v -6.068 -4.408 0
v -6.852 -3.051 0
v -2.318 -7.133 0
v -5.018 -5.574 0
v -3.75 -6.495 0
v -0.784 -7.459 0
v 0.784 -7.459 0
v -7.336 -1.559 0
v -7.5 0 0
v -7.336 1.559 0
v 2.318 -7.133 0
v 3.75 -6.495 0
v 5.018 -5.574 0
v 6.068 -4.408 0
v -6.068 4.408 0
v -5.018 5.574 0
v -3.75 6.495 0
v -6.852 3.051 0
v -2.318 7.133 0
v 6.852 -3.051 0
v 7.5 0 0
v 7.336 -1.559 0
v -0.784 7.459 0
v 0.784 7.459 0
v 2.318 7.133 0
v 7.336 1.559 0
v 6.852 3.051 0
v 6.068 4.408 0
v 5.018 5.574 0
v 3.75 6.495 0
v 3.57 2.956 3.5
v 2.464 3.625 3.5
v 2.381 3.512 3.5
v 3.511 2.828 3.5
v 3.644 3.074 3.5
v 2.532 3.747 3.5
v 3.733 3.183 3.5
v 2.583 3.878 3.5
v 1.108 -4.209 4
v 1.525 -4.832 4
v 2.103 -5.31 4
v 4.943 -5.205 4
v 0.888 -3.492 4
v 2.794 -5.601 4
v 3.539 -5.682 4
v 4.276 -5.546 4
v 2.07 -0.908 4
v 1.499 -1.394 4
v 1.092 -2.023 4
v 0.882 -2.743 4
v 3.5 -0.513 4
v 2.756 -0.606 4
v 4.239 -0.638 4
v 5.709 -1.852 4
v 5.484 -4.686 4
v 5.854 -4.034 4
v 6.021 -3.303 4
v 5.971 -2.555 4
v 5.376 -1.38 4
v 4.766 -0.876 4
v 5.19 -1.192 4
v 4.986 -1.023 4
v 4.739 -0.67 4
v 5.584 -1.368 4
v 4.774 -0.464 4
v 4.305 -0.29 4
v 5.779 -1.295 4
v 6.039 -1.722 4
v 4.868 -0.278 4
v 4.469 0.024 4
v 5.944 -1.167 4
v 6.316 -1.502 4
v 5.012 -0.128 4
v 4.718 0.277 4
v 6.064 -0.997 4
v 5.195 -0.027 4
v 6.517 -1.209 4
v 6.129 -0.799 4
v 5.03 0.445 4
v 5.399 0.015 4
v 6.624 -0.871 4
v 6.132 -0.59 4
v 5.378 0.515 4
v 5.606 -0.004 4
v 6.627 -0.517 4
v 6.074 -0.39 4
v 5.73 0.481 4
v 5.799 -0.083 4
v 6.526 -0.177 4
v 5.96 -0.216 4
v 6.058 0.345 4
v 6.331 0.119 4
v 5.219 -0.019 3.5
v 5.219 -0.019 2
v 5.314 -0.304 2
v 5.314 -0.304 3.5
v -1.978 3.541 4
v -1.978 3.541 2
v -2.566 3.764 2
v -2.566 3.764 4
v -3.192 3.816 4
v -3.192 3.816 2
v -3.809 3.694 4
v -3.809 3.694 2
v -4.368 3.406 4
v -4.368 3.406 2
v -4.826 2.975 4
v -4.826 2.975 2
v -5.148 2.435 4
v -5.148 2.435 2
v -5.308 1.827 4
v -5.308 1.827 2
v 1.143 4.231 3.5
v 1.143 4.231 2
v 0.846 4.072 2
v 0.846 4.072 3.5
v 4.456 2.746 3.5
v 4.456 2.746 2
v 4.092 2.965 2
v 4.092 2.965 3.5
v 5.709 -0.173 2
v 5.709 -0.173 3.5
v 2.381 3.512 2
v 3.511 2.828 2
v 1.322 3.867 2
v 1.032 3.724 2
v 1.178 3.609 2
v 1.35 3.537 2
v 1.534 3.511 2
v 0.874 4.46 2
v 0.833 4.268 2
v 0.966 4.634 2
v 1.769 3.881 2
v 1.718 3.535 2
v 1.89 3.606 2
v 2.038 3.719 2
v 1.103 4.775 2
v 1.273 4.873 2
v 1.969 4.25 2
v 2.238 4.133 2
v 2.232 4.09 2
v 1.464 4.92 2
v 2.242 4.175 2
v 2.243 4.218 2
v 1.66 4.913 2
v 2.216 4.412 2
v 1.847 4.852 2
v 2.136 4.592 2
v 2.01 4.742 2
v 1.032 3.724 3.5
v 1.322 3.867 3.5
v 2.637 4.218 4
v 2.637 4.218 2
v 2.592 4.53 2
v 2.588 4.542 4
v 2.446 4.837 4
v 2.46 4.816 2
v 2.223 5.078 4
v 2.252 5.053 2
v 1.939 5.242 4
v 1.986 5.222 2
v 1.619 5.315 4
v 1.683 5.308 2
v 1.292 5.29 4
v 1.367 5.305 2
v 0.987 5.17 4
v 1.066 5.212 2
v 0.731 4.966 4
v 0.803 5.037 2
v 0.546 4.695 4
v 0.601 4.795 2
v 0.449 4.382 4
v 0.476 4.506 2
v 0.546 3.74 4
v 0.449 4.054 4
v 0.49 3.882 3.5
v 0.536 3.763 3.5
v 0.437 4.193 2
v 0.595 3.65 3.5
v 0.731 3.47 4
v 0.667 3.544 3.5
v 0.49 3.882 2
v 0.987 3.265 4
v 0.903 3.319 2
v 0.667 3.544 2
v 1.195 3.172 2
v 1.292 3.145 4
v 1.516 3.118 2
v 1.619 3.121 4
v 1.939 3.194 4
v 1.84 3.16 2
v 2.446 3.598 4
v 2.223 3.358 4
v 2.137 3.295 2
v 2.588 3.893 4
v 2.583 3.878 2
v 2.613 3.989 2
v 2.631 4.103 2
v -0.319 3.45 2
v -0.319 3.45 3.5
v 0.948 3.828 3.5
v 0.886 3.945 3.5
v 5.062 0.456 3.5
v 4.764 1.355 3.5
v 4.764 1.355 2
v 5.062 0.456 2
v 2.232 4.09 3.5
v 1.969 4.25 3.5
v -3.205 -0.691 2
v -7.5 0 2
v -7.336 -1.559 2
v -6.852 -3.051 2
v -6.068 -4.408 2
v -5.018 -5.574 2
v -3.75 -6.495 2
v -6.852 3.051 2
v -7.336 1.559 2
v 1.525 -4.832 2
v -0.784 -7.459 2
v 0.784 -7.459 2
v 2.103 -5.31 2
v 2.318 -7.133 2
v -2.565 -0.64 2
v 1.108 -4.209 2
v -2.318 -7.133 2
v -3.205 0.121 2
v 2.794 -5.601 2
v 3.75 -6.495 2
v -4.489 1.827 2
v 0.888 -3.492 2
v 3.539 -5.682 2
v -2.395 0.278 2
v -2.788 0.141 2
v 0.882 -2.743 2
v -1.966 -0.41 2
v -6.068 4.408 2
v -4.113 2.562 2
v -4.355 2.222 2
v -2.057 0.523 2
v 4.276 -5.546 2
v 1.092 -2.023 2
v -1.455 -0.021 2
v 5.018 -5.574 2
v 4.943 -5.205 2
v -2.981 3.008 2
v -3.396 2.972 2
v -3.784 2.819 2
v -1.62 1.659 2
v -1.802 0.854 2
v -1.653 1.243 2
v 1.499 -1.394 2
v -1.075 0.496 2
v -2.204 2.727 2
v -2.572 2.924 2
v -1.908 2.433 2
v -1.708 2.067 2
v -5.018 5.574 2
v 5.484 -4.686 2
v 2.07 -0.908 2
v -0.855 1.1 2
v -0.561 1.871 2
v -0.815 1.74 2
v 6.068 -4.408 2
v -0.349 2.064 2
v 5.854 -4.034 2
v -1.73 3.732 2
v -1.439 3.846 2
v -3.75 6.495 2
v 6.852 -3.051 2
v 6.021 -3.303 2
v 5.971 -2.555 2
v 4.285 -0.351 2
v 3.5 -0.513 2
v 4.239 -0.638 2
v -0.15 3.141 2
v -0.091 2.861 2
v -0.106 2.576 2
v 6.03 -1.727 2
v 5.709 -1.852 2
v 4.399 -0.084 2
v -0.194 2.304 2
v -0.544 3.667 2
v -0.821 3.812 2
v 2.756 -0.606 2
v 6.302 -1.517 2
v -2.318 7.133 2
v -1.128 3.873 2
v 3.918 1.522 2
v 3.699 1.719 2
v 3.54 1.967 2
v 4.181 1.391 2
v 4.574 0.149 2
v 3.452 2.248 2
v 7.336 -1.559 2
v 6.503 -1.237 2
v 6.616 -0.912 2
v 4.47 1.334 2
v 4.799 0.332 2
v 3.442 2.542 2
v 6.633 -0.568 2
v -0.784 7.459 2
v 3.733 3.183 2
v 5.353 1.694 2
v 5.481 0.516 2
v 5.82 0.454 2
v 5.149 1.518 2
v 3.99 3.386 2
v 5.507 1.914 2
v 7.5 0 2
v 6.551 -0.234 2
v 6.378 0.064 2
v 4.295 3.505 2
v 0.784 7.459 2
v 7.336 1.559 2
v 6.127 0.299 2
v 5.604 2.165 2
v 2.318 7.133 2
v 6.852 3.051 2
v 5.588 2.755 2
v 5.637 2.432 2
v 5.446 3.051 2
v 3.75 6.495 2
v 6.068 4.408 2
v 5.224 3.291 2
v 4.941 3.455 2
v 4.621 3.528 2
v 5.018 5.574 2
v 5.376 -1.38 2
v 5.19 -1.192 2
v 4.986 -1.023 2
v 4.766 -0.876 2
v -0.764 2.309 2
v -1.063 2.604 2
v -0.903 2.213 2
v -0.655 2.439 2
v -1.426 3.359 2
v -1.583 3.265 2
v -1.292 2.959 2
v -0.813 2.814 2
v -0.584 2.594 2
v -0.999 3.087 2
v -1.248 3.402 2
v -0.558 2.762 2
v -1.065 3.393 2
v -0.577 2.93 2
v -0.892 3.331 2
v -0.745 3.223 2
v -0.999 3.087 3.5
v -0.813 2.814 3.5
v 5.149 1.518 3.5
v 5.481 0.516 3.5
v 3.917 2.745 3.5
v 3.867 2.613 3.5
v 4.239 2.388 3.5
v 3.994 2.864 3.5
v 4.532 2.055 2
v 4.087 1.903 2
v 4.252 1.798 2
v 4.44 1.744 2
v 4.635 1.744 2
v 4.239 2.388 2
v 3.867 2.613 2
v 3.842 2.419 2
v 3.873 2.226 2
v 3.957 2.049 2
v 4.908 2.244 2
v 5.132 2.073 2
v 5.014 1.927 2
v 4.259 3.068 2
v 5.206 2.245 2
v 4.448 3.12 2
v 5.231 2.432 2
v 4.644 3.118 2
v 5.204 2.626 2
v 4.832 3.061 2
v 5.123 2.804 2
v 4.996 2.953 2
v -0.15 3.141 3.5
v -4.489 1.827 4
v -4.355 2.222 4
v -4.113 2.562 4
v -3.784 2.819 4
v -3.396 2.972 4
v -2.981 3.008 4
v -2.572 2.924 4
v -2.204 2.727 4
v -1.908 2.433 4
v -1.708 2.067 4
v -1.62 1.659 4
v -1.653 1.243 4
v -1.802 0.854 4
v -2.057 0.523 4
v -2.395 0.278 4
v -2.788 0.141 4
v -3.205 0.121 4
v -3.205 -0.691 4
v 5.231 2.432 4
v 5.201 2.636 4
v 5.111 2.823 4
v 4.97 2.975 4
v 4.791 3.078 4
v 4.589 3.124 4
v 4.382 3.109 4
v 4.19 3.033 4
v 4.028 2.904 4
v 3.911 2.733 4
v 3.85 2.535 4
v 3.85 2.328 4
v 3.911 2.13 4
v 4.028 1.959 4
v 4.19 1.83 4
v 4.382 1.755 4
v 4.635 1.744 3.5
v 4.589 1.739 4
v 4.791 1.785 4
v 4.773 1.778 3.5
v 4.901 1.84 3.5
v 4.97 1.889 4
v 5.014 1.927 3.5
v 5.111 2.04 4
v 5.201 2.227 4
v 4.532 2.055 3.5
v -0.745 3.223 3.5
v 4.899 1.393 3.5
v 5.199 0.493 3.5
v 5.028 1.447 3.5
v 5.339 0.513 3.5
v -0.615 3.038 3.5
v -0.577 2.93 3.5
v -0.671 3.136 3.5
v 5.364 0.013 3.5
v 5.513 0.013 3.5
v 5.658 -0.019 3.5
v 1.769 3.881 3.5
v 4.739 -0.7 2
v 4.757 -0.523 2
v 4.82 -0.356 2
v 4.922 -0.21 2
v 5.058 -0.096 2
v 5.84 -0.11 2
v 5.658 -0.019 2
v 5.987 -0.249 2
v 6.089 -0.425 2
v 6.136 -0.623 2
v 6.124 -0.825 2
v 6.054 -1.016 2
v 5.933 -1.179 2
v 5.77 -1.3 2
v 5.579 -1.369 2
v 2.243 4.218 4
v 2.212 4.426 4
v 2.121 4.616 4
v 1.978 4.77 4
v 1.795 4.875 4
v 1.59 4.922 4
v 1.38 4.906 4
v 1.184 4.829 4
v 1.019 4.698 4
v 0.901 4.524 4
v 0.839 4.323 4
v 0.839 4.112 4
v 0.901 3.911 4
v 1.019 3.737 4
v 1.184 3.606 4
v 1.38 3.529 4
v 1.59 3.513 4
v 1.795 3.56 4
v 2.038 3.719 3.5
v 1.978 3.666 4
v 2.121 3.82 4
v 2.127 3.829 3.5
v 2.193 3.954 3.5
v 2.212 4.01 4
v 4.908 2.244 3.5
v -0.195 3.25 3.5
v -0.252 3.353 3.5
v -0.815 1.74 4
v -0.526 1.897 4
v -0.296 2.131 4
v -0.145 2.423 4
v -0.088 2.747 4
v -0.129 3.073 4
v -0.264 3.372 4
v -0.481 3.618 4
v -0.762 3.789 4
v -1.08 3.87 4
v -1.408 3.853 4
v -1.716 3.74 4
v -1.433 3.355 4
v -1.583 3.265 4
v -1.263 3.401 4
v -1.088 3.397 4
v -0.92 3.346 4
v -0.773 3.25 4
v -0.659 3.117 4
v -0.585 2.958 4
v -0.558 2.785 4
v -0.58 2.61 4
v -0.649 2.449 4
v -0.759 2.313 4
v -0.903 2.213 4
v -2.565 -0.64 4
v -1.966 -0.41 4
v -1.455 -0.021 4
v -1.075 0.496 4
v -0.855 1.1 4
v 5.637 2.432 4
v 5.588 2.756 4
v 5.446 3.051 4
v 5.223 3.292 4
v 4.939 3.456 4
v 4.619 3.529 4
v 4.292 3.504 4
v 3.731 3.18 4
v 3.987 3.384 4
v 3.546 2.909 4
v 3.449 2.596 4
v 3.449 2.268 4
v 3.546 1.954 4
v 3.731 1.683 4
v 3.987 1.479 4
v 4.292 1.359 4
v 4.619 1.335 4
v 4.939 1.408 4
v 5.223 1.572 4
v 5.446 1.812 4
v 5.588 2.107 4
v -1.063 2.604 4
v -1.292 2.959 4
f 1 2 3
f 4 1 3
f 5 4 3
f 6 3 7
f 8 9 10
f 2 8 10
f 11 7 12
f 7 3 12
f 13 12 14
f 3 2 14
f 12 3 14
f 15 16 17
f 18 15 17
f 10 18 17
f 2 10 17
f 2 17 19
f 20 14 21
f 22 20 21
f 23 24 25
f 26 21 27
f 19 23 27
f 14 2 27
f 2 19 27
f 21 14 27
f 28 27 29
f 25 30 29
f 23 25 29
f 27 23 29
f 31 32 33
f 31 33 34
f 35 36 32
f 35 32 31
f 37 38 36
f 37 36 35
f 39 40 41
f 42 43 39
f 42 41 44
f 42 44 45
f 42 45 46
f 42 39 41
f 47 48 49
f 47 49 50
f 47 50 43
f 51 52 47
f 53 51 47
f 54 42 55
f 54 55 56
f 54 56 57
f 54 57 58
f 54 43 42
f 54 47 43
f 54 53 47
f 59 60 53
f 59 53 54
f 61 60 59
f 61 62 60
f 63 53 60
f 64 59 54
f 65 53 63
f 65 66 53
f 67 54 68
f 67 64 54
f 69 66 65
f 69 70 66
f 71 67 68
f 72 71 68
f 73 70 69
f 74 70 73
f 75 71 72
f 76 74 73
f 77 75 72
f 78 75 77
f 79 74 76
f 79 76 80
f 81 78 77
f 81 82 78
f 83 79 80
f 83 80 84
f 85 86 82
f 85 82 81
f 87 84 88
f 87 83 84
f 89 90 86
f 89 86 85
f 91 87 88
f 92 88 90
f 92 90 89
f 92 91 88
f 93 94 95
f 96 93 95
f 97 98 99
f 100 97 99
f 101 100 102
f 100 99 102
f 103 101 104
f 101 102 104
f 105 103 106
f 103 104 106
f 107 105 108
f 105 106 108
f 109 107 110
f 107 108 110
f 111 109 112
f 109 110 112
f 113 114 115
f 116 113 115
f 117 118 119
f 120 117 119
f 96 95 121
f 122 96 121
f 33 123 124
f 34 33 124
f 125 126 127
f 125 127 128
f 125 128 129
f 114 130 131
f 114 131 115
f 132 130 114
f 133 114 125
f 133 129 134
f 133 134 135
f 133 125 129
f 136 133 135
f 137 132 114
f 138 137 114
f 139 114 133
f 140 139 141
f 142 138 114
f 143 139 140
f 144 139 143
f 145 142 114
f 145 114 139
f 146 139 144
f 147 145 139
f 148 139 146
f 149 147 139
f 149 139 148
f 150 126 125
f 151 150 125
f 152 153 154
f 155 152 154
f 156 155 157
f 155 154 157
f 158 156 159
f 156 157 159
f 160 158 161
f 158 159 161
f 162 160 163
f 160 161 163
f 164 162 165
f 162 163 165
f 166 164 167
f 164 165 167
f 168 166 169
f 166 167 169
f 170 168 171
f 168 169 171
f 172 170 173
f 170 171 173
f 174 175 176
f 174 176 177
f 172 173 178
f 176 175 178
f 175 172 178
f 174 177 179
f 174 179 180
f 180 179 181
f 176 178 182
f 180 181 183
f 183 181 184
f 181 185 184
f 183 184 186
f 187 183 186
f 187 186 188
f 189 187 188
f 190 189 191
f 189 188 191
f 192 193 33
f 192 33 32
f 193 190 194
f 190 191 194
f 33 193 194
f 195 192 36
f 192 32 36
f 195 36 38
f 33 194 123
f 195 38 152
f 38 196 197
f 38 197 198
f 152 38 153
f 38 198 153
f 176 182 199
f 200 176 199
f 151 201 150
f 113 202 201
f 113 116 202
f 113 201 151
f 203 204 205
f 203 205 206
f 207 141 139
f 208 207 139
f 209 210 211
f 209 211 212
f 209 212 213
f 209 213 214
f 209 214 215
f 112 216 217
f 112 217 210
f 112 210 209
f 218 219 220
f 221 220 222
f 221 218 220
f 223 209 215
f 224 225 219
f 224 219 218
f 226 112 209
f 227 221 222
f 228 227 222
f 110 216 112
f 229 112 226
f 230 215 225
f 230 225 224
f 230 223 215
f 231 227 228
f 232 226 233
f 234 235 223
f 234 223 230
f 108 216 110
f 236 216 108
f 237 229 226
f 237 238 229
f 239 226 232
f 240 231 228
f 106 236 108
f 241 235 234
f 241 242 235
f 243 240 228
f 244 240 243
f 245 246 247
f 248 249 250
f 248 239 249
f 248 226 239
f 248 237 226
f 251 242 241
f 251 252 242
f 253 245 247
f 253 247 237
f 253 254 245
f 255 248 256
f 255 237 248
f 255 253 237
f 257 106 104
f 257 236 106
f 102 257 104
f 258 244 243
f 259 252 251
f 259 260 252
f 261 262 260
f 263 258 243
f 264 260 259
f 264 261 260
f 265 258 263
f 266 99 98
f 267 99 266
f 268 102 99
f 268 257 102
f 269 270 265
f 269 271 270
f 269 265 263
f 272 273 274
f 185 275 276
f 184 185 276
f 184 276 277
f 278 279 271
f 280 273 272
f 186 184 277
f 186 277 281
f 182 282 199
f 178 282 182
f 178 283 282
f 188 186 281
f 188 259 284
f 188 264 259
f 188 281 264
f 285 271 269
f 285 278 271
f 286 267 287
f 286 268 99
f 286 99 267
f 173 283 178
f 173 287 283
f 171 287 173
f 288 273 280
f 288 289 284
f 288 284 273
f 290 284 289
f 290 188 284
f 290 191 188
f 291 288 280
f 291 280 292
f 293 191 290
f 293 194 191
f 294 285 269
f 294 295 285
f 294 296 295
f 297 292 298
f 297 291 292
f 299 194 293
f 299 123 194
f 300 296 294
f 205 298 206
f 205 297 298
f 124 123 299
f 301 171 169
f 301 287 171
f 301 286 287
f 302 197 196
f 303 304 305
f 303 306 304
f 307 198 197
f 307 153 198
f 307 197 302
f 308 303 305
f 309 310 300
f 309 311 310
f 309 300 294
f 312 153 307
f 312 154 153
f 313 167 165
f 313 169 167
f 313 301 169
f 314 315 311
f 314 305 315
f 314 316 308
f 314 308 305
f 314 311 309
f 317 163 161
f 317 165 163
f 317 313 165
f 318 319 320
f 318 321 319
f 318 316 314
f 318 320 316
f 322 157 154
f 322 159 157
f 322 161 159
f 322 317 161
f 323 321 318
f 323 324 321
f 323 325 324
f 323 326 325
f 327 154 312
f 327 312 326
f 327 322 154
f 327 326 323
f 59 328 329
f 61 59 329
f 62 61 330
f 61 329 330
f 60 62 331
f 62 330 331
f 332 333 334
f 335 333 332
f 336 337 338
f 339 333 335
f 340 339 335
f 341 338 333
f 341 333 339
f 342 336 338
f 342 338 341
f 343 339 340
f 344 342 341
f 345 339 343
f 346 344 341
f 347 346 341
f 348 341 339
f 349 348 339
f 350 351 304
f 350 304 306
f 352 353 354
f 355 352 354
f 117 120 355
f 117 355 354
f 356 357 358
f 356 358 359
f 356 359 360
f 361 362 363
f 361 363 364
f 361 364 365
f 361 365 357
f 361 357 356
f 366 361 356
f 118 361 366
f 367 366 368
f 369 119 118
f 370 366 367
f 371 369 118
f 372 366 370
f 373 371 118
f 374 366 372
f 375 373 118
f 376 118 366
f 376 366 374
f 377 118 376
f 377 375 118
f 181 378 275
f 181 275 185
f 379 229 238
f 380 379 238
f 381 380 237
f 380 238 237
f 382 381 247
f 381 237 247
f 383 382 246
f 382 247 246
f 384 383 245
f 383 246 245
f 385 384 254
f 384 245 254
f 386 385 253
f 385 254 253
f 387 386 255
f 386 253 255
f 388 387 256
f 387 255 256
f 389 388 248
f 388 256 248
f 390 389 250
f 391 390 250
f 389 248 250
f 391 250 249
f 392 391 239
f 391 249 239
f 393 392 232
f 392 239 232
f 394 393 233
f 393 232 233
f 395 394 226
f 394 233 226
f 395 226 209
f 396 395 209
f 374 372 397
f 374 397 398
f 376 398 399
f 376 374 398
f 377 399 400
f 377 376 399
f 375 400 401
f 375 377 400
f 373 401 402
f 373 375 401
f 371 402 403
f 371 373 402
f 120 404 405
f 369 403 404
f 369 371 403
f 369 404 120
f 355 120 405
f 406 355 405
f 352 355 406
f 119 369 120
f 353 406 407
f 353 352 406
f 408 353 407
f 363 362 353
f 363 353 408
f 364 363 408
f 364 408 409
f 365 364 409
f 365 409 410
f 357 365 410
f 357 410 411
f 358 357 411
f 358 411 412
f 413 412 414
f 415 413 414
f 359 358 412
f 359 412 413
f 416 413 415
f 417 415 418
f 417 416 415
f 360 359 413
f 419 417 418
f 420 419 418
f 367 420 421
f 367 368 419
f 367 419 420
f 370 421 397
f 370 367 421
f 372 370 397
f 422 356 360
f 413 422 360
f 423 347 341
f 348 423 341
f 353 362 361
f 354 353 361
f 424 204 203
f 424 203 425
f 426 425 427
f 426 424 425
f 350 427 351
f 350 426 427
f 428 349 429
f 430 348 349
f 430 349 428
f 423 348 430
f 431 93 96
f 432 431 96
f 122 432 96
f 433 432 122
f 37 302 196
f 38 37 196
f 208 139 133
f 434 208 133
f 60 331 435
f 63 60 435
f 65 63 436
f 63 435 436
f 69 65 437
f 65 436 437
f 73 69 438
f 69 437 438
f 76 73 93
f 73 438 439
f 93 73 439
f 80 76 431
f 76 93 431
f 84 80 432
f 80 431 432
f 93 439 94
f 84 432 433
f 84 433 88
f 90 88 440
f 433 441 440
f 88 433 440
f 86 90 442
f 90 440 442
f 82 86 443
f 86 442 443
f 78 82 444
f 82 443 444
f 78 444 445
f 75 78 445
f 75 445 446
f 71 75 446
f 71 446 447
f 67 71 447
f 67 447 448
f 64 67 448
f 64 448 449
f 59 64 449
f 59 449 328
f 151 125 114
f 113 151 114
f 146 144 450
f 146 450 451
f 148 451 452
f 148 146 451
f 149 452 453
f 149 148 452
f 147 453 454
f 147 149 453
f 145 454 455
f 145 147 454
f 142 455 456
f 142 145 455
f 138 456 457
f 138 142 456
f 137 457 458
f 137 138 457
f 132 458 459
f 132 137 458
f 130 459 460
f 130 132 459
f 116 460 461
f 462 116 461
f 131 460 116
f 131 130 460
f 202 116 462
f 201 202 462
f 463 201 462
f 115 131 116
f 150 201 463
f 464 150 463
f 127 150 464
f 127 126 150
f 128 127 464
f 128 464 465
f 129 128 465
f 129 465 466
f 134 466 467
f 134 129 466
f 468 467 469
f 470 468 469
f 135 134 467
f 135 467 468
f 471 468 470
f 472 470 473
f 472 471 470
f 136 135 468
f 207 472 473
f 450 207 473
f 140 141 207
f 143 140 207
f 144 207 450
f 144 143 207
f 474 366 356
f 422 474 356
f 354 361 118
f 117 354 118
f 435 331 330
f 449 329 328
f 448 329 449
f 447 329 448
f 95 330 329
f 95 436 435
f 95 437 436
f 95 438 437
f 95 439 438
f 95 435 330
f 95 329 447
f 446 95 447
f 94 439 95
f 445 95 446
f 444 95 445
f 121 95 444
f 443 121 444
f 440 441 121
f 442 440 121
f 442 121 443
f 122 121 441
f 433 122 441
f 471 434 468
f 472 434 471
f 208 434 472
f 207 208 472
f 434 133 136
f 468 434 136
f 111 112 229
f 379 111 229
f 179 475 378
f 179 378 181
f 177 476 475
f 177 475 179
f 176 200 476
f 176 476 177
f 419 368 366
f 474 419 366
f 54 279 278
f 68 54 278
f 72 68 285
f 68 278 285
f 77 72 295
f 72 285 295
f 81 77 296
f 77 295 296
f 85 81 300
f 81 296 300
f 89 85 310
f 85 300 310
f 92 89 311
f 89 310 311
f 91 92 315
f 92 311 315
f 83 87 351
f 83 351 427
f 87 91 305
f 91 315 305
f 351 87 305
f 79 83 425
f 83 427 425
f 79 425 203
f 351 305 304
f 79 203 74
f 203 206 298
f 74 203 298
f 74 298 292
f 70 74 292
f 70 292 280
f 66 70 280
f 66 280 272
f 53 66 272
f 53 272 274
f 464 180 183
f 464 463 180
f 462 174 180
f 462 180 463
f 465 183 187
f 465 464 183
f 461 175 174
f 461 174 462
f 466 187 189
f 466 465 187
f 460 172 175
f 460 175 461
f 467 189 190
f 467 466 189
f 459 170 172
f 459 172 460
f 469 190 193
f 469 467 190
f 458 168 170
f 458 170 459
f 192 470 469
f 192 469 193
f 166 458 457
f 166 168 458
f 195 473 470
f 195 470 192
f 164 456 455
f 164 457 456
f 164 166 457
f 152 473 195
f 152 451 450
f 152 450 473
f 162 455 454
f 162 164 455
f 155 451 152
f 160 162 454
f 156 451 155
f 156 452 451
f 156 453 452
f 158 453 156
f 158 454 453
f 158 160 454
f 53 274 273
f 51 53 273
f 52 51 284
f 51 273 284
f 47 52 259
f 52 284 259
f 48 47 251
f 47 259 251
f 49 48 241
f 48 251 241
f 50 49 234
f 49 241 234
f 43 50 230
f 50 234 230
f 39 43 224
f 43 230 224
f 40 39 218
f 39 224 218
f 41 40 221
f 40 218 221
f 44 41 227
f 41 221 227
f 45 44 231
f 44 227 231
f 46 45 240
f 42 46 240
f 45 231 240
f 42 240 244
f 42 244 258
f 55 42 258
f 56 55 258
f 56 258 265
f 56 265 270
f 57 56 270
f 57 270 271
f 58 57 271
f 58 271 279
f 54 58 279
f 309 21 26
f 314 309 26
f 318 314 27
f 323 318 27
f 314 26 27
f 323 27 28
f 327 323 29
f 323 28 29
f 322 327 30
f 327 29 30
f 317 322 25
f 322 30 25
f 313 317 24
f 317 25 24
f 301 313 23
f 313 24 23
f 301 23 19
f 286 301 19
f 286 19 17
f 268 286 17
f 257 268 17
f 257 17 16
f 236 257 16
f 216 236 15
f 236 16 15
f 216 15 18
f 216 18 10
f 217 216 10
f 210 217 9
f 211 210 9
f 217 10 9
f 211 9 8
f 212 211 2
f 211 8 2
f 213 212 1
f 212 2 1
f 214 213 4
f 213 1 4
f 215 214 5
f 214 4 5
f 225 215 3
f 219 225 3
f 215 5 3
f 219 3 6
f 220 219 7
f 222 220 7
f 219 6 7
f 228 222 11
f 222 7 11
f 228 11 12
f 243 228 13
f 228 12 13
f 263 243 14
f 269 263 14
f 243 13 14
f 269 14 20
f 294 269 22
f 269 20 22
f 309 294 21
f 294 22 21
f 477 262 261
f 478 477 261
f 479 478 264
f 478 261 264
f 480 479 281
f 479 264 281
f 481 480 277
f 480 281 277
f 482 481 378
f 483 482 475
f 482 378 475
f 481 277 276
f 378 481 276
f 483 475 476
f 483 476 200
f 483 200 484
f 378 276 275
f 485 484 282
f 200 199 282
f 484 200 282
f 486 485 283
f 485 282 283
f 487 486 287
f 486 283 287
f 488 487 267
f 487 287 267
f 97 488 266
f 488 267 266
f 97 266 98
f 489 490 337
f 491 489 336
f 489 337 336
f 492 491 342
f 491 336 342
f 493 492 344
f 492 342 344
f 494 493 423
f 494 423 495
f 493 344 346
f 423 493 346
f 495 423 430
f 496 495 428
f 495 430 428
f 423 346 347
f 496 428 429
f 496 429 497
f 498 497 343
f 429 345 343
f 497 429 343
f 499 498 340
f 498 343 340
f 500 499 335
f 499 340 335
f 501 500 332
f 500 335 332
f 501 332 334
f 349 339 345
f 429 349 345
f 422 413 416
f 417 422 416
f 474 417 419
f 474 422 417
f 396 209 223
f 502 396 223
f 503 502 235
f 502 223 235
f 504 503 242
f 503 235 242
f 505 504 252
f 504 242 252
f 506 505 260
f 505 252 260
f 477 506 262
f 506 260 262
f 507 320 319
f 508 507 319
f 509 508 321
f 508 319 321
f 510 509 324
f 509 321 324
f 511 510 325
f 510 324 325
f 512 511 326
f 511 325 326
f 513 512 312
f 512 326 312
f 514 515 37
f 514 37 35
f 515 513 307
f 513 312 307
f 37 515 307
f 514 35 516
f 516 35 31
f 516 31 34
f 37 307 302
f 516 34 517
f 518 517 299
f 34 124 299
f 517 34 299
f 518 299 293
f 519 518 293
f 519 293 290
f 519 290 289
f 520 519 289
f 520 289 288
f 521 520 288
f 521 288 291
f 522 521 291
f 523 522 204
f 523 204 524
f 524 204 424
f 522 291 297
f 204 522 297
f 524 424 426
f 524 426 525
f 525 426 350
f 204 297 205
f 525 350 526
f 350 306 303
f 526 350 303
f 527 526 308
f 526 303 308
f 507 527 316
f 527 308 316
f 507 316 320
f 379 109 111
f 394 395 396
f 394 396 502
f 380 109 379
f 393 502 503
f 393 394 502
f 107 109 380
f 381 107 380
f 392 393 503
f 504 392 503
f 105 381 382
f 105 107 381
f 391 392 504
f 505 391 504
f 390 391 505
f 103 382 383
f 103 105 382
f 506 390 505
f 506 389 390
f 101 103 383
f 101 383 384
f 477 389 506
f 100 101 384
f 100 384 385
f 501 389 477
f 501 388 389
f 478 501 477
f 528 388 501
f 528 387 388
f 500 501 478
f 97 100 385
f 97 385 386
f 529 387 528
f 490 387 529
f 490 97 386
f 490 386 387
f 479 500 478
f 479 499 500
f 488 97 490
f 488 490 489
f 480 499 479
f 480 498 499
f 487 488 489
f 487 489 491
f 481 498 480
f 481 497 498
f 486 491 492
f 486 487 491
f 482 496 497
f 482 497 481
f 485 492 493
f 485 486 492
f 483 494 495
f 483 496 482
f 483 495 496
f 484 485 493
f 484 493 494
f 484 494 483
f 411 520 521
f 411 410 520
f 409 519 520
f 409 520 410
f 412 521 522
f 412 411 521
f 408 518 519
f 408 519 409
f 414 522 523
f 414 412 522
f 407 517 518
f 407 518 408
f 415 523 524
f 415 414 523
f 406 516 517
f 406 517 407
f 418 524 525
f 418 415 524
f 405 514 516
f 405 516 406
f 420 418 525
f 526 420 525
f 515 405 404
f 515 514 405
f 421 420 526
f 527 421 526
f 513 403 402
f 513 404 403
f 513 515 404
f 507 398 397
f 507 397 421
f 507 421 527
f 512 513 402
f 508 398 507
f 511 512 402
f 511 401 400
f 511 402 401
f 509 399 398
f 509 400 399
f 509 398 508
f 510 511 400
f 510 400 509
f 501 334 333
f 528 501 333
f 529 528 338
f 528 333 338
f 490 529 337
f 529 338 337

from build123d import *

# Parameters (mm, degrees)
F0_R     = 7.5
F1_DEPTH = 2
F2_R     = 1.1
F2_R_2   = 0.70626
F2_R_3   = 0.694508
F3_DEPTH = 2
F5_DEPTH = 1.5


with BuildPart() as f1:
    # F0 (on Top) → F1 (new body)
    with BuildSketch(Plane.XY):
        Circle(F0_R)
    extrude(amount=F1_DEPTH)

    # F2 (on face) → F3 (join)
    with BuildSketch(Plane.XY.offset(2)):
        with BuildLine():
            ThreePointArc((5.709143, -1.852388), (6.202641, 0.241821), (4.239235, -0.638116))
            ThreePointArc((4.239235, -0.638116), (1.796573, -5.09184), (5.709143, -1.852388))
        make_face()
        with BuildLine():
            ThreePointArc((4.765573, -0.876203), (5.884142, -0.14373), (5.375983, -1.380455))
            ThreePointArc((5.375983, -1.380455), (5.090193, -1.104827), (4.765573, -0.876203))
        make_face(mode=Mode.SUBTRACT)
        with Locations((1.537181, 4.217723)):
            Circle(F2_R)
        with Locations((1.537181, 4.217723)):
            Circle(F2_R_2, mode=Mode.SUBTRACT)
        with Locations((4.536864, 2.431652)):
            Circle(F2_R)
        with Locations((4.536864, 2.431652)):
            Circle(F2_R_3, mode=Mode.SUBTRACT)
        with BuildLine():
            Line((-3.205112, 0.120576), (-3.205112, -0.691418))
            ThreePointArc((-3.205112, -0.691418), (-1.455226, -0.020752), (-0.814583, 1.740348))
            ThreePointArc((-0.814583, 1.740348), (-0.263788, 3.372074), (-1.977704, 3.540587))
            ThreePointArc((-1.977704, 3.540587), (-4.098503, 3.56954), (-5.307508, 1.82686))
            Line((-5.307508, 1.82686), (-4.48911, 1.82686))
            ThreePointArc((-4.48911, 1.82686), (-1.908134, 2.43282), (-3.205112, 0.120576))
        make_face()
        with BuildLine():
            ThreePointArc((-1.583388, 3.265403), (-0.658546, 3.117024), (-0.903388, 2.212922))
            ThreePointArc((-0.903388, 2.212922), (-1.168911, 2.787281), (-1.583388, 3.265403))
        make_face(mode=Mode.SUBTRACT)
    extrude(amount=F3_DEPTH)

    # F4 (on face) → F5 (join)
    with BuildSketch(Plane.XY.offset(2)):
        Polygon((1.142579, 4.2306), (-0.998543, 3.087274), (-0.813259, 2.813969), (1.321921, 3.866934), align=None)
        Polygon((4.455775, 2.74566), (1.968617, 4.249523), (1.769449, 3.881378), (4.239448, 2.387889), align=None)
        Polygon((4.908196, 2.244463), (4.531938, 2.055495), (5.313687, -0.303966), (5.709143, -0.172942), align=None)
    extrude(amount=F5_DEPTH)


solid = f1.part
